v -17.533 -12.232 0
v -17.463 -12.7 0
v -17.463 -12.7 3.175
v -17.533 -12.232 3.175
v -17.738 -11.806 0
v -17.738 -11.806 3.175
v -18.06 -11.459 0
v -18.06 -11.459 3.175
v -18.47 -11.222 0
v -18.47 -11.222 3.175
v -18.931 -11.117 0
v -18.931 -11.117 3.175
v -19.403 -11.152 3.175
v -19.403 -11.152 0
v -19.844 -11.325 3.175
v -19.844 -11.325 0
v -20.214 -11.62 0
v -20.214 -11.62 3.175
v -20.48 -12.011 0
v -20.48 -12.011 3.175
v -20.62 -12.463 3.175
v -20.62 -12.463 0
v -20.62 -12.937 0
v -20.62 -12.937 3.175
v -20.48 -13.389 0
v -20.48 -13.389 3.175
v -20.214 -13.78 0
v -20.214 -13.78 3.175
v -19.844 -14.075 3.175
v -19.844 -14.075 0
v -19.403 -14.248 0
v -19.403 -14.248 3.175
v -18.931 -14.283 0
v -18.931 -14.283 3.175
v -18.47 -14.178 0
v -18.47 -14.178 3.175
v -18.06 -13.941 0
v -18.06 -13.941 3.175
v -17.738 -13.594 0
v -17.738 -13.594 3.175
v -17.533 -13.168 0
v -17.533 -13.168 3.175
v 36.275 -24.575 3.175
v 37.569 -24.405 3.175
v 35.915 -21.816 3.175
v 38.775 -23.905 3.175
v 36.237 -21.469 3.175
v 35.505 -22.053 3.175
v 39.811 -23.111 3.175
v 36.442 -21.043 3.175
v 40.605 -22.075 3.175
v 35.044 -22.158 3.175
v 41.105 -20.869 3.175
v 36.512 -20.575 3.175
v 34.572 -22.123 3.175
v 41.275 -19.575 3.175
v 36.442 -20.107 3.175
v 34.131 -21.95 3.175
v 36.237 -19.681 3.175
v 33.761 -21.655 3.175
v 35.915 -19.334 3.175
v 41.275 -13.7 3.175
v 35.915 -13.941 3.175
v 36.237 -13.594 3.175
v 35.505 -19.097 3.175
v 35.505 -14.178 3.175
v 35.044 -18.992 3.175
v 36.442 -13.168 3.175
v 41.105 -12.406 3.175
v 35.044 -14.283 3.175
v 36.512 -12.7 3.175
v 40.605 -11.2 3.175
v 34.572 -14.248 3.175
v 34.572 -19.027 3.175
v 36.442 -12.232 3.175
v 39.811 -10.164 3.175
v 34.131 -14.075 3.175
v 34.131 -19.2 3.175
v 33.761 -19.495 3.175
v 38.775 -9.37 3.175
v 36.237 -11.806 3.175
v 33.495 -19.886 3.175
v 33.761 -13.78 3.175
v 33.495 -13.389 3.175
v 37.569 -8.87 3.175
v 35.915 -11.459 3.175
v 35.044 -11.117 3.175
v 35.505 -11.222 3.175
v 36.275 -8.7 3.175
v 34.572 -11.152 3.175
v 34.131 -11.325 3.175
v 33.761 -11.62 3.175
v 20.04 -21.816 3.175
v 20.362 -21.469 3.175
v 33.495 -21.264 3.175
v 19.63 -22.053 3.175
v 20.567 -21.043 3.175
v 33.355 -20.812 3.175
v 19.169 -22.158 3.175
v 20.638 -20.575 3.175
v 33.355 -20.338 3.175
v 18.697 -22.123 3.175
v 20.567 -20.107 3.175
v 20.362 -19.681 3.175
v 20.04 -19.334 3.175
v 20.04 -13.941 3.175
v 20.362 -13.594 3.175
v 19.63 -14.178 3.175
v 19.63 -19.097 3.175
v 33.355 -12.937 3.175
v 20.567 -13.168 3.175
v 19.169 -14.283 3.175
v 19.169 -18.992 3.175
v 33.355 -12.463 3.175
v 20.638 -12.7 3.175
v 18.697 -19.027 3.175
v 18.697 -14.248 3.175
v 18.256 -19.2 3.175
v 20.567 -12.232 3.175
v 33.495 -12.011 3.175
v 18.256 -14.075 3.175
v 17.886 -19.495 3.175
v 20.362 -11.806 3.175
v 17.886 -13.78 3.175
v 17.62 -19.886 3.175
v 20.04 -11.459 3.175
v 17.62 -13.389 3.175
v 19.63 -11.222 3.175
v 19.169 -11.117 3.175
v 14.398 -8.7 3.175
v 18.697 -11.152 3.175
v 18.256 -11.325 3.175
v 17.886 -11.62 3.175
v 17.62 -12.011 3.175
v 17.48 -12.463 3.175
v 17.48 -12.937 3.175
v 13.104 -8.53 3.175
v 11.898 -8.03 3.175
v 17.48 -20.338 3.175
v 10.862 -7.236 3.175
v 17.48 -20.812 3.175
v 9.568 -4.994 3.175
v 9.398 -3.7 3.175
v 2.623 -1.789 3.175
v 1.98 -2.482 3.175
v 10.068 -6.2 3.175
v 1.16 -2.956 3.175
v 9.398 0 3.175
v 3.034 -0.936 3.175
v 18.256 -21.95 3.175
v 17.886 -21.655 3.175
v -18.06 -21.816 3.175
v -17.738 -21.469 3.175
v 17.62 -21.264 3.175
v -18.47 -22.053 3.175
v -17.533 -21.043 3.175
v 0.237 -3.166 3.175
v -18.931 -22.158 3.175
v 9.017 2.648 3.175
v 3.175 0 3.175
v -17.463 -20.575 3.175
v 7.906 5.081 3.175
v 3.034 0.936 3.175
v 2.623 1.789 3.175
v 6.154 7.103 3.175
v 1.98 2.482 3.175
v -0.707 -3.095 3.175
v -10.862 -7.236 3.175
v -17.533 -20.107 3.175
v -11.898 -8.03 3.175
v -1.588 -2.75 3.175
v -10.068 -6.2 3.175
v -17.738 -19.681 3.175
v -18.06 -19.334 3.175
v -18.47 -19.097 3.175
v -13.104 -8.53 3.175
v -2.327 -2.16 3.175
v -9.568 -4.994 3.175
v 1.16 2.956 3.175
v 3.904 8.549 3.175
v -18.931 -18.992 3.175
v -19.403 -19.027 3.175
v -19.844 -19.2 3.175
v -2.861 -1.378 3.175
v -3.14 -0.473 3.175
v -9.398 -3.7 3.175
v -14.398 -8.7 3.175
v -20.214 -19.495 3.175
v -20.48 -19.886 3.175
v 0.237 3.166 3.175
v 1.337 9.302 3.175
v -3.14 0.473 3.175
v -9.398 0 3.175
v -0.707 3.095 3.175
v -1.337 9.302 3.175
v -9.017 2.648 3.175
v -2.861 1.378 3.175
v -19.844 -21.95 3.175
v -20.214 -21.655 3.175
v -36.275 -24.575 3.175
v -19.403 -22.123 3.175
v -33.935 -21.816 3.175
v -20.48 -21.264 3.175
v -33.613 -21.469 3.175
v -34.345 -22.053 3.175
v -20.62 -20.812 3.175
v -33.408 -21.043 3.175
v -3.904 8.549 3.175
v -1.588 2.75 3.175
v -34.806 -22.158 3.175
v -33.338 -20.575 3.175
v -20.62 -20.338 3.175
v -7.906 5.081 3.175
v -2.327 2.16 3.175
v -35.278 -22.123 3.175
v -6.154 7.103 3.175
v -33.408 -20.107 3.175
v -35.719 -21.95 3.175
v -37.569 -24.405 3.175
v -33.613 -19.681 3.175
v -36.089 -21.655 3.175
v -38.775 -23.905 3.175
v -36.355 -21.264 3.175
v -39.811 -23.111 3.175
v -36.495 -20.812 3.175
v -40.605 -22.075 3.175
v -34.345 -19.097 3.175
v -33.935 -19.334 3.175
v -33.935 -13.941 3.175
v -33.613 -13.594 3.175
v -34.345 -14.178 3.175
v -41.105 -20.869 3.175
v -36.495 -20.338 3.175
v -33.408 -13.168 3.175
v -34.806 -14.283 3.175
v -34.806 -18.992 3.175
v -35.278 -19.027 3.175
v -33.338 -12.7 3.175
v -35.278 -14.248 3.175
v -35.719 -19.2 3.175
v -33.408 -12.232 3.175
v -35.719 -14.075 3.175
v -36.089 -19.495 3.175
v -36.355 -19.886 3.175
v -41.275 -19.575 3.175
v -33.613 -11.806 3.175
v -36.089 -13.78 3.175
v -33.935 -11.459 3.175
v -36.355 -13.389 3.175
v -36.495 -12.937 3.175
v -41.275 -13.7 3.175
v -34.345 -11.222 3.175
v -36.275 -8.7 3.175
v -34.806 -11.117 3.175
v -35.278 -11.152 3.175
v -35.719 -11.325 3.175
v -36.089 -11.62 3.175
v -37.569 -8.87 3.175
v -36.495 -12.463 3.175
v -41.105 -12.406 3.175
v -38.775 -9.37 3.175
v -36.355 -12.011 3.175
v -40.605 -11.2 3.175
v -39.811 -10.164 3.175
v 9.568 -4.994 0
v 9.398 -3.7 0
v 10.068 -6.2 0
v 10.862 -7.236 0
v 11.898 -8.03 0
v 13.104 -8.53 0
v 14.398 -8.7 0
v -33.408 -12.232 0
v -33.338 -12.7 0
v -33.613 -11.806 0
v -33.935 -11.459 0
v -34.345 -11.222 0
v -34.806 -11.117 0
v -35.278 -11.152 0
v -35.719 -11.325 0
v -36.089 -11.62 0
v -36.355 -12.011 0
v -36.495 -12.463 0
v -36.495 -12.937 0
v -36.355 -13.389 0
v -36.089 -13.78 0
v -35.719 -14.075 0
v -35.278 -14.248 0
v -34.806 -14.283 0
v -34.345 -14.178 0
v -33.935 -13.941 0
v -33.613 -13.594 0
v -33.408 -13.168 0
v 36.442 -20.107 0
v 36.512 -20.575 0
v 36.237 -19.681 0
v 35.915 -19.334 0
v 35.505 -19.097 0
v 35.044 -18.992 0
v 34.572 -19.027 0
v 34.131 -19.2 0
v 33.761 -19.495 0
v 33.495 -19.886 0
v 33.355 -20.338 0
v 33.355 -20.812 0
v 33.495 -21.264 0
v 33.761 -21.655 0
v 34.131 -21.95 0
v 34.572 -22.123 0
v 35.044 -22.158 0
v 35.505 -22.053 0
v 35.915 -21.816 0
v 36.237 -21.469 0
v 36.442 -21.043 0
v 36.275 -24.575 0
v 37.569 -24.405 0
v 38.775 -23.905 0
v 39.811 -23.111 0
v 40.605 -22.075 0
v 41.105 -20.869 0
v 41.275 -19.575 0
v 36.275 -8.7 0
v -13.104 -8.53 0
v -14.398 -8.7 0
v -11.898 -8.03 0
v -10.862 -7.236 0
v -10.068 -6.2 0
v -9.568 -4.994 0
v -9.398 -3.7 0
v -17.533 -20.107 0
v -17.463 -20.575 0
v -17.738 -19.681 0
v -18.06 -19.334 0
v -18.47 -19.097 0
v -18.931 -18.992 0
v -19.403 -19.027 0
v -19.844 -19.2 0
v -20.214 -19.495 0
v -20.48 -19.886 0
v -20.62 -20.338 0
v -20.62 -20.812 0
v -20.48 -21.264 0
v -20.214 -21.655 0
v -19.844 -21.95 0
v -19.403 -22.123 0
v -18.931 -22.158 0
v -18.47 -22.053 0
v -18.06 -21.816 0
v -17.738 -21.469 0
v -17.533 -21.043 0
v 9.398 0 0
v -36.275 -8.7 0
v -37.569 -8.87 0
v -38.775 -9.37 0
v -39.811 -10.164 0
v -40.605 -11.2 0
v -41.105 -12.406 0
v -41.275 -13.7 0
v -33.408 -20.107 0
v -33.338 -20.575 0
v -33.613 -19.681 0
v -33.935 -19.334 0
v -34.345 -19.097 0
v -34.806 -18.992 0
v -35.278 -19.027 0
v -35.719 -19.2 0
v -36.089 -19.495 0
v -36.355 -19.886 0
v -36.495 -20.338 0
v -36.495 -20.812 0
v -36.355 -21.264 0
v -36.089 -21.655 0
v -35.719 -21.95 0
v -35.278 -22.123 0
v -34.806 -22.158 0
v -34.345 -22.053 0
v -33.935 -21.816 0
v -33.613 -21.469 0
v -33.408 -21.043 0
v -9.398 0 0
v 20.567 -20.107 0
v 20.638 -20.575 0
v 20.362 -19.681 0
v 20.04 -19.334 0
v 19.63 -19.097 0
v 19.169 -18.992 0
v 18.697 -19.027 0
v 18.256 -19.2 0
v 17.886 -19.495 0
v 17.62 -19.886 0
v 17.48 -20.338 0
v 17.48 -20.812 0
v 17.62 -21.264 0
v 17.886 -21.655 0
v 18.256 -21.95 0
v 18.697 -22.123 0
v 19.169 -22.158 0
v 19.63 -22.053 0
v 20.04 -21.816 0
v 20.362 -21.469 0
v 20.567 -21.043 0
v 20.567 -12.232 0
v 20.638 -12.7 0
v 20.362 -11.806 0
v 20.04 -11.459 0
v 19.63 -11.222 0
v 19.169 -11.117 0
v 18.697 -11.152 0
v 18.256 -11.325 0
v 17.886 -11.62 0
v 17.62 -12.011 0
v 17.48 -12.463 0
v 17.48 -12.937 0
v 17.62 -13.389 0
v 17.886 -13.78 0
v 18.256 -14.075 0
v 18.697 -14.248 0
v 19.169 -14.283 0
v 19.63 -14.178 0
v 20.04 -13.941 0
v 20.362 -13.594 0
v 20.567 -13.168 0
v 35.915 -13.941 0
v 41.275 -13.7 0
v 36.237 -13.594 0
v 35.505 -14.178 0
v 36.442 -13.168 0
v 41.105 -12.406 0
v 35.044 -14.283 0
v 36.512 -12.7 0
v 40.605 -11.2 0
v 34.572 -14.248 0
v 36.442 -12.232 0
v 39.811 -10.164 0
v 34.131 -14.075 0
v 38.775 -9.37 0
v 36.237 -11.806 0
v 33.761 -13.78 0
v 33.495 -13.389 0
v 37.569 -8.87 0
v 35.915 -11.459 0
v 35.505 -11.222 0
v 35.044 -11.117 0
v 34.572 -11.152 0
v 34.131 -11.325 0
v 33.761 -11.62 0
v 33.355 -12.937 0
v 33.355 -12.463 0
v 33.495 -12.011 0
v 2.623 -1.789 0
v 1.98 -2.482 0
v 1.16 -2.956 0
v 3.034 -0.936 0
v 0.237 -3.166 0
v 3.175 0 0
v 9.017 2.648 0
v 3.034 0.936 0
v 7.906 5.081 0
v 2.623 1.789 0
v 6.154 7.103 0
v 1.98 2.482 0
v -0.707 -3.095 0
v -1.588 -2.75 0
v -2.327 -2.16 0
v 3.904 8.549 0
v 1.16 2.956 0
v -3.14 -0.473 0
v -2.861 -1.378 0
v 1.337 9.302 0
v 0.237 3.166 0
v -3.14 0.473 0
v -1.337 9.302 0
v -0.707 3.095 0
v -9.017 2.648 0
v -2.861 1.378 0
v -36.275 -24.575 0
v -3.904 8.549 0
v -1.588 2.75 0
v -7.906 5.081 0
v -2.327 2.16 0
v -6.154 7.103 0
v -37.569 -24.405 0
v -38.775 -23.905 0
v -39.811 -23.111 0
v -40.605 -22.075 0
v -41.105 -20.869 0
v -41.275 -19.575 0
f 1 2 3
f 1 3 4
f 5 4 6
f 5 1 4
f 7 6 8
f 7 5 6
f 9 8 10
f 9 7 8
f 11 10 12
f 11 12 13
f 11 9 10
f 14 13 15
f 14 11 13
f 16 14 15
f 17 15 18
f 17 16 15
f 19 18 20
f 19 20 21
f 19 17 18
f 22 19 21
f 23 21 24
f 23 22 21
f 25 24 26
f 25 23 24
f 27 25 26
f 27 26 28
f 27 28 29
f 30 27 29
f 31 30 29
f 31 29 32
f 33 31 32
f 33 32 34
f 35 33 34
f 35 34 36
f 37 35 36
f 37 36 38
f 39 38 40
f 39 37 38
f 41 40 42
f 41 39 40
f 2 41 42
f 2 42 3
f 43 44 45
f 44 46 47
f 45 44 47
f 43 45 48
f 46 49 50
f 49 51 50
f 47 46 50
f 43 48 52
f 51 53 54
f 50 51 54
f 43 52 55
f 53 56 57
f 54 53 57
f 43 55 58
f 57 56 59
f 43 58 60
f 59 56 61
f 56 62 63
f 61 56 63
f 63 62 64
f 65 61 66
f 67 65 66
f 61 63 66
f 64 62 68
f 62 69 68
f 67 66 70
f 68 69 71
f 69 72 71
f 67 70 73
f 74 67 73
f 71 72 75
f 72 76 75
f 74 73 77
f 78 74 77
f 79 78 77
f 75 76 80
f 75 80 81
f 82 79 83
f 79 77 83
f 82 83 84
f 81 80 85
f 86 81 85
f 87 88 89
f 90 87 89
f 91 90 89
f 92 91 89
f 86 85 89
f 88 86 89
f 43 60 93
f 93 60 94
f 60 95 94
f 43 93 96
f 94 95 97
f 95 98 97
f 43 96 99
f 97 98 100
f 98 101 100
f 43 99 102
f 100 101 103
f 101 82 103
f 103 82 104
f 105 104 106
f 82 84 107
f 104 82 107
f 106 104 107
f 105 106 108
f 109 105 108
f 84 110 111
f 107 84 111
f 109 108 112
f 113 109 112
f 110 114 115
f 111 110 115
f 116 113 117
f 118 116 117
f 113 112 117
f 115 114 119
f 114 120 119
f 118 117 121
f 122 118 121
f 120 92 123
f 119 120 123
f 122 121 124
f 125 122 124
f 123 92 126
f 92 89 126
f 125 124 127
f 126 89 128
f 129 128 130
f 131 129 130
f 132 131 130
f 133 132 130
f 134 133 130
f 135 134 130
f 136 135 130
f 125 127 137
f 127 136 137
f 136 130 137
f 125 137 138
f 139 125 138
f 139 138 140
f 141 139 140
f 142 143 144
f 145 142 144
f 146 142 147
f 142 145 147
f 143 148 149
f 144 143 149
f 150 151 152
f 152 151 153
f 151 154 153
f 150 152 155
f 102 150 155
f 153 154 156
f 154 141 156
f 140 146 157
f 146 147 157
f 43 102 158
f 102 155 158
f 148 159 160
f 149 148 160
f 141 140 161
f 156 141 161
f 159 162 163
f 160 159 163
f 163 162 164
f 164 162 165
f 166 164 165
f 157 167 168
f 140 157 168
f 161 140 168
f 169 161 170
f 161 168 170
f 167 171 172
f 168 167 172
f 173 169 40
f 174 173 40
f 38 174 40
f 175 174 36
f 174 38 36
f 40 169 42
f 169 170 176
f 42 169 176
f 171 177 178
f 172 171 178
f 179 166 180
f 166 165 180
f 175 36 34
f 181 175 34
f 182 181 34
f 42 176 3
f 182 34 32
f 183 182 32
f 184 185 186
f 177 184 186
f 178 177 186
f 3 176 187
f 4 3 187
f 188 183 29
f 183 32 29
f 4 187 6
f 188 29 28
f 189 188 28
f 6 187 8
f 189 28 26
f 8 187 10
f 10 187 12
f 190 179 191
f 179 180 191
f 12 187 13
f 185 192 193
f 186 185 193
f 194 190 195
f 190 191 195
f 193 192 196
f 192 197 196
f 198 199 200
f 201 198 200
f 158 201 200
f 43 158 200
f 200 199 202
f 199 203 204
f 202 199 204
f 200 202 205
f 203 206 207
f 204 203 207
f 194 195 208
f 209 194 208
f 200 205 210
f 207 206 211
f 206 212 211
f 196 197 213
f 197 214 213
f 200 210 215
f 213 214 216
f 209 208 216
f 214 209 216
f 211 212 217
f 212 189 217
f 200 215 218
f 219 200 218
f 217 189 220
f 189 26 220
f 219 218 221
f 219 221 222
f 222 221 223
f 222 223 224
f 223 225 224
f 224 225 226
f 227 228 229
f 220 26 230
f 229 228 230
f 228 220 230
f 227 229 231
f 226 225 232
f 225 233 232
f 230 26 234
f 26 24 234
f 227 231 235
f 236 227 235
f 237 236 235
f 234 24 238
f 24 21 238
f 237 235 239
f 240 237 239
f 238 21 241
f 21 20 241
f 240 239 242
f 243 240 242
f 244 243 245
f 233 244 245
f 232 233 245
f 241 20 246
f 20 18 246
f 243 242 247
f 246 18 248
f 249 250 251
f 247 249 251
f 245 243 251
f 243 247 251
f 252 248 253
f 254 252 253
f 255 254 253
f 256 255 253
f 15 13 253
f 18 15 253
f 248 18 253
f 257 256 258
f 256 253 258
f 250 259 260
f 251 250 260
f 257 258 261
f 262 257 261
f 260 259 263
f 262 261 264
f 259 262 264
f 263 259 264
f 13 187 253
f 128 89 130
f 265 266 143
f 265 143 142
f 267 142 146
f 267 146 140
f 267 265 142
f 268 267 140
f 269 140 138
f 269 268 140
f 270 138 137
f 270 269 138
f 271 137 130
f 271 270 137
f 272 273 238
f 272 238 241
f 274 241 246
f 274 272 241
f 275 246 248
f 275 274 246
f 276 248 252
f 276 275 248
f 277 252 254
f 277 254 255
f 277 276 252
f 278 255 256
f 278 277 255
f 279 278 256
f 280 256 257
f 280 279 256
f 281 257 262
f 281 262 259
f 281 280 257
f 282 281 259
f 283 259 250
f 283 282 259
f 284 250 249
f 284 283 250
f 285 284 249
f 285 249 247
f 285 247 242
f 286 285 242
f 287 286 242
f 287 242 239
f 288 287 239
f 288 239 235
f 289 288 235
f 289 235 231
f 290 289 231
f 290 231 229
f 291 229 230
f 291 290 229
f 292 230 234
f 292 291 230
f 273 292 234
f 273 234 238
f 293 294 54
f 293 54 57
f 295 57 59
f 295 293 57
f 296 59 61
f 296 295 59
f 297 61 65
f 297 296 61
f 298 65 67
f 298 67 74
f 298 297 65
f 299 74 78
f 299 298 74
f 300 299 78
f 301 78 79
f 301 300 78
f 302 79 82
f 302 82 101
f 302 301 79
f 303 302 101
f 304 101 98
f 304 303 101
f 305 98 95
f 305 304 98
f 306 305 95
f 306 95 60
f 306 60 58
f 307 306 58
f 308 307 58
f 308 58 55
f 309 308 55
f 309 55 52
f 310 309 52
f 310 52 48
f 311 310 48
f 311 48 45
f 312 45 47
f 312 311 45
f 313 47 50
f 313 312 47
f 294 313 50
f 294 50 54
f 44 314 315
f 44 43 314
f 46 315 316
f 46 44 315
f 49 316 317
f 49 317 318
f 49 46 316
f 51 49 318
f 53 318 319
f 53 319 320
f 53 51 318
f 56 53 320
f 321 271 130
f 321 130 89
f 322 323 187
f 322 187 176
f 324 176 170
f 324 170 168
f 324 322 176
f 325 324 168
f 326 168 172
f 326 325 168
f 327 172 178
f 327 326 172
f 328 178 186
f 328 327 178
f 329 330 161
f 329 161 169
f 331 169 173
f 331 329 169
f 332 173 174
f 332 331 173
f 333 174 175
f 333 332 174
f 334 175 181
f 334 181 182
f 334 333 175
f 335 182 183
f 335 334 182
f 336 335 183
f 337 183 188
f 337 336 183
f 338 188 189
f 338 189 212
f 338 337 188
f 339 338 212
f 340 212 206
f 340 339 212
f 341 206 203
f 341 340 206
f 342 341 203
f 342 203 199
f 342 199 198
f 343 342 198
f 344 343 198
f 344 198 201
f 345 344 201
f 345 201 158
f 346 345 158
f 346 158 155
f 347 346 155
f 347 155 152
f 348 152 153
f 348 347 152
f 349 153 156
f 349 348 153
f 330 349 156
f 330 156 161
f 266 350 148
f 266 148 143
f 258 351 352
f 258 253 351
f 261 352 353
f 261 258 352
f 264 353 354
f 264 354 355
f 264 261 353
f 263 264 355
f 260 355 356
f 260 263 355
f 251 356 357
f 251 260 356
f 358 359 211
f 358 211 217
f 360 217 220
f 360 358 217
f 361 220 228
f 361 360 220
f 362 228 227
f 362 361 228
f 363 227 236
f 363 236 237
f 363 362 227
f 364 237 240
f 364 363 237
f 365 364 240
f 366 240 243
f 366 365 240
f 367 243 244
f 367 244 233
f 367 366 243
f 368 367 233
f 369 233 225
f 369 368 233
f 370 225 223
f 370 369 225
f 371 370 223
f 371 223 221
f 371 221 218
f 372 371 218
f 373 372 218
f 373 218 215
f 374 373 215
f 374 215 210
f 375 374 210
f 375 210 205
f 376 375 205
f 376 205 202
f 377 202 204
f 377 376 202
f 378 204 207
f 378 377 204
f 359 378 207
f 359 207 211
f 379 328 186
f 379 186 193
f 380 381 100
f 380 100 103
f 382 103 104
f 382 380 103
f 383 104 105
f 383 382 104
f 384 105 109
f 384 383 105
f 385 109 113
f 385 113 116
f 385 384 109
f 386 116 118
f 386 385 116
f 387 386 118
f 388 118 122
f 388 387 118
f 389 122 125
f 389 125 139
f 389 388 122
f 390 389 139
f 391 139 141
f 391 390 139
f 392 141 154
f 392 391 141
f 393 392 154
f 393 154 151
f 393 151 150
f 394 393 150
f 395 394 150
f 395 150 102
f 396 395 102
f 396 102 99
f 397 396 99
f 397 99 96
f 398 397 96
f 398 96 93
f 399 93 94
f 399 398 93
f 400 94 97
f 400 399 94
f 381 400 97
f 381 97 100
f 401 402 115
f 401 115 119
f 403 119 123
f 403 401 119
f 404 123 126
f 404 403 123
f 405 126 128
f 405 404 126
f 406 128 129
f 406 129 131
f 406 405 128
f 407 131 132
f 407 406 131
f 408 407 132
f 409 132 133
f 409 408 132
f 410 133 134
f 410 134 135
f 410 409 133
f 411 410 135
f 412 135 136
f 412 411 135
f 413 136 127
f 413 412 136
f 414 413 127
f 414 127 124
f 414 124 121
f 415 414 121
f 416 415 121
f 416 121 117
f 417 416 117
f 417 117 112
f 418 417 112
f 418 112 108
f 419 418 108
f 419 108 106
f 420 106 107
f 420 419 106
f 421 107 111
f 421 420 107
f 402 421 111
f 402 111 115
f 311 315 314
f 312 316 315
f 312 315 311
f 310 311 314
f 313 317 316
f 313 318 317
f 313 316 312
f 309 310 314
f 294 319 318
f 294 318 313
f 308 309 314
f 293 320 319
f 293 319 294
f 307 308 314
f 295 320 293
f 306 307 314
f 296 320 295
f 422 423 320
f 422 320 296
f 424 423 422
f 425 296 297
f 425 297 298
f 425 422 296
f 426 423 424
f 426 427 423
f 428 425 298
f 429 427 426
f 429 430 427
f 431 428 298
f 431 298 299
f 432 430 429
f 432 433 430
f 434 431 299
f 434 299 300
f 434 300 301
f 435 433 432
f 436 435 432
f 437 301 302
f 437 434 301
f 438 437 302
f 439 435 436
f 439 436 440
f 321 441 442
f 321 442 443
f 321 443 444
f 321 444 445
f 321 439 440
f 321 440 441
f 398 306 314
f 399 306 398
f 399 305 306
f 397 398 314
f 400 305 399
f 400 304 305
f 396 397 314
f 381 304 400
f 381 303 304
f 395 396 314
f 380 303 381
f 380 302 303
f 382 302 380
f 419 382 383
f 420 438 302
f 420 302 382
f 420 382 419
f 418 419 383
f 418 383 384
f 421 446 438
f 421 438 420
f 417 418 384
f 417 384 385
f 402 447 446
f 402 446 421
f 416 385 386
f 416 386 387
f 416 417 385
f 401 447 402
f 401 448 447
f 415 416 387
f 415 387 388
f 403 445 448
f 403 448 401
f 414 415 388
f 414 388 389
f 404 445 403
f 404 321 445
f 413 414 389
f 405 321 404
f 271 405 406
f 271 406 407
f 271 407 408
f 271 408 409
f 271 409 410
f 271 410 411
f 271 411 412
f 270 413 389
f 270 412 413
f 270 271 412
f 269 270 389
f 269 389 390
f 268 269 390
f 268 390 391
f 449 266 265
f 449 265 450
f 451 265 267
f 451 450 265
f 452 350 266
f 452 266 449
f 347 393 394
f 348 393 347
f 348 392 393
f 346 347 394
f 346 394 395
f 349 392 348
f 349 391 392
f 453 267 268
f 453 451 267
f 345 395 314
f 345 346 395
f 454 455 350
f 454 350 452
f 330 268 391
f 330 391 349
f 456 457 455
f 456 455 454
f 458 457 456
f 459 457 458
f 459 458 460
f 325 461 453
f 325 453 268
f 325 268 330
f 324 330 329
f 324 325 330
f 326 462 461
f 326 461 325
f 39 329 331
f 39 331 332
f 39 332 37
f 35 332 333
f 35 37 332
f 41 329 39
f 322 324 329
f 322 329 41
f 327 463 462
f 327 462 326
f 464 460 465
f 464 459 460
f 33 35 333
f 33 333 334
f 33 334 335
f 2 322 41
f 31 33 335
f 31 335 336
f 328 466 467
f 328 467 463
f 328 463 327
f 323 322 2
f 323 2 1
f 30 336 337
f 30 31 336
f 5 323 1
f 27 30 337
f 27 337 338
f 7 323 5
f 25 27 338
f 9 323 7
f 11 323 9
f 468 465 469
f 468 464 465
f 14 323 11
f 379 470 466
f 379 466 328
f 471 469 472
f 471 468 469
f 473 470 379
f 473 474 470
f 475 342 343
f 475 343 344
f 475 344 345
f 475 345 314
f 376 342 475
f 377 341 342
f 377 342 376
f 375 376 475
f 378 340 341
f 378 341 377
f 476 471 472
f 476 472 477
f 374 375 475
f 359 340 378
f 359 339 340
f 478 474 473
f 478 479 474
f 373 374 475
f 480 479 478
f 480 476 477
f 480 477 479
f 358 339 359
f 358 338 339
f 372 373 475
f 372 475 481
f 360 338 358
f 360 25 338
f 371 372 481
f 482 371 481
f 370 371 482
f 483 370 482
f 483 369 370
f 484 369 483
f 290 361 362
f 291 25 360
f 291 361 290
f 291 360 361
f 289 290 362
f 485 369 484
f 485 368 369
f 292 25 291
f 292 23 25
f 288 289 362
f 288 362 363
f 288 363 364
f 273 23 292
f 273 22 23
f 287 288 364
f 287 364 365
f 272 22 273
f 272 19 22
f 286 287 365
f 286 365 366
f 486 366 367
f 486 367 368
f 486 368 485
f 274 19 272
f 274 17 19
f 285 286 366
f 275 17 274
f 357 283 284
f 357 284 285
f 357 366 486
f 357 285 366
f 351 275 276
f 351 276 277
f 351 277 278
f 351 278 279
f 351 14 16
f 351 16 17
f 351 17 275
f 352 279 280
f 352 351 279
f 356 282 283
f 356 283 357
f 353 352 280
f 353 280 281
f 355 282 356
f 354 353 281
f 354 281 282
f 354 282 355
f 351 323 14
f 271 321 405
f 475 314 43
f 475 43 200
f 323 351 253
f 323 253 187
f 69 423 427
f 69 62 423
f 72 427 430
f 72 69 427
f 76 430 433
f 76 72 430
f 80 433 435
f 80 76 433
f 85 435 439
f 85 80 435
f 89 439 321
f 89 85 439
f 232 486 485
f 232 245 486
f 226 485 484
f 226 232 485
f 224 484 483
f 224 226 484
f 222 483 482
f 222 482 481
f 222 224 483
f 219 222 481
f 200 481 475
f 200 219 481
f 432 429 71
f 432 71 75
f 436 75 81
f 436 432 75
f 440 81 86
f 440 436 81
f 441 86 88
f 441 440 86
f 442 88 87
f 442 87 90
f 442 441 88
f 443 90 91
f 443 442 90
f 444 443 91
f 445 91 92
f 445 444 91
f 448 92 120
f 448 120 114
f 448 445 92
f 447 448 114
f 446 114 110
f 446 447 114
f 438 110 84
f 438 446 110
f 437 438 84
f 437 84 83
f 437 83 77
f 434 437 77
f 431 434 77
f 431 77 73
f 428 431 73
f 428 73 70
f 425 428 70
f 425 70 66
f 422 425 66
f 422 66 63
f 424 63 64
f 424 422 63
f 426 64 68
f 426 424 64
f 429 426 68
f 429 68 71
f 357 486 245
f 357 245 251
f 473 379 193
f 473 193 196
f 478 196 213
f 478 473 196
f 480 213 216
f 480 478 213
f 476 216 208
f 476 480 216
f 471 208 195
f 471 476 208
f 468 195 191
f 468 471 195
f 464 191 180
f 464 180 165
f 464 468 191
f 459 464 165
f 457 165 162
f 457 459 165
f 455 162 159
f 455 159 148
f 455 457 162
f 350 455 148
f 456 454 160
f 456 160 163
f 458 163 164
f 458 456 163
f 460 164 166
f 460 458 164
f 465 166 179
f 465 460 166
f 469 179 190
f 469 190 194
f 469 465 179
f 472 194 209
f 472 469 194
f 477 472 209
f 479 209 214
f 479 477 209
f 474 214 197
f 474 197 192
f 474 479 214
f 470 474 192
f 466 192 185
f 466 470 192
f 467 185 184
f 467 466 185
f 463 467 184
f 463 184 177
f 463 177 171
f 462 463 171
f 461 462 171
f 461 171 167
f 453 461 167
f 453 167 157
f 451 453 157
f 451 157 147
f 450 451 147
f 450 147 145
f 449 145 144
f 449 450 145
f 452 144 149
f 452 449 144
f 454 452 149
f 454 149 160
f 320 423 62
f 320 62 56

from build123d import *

# Parameters (mm, degrees)
SKETCH1_R           = 3.175
SKETCH1_R_2         = 1.5875
BOSS_EXTRUDE1_DEPTH = 3.175
FILLET1_R           = 5


with BuildPart() as part:
    # Sketch1 → Boss-Extrude1 (new body)
    with BuildSketch(Plane.XY):
        with BuildLine():
            Line((-41.275, -8.7), (-14.398, -8.7))
            ThreePointArc((-14.398, -8.7), (-10.862466094, -7.235533906), (-9.398, -3.7))
            Line((-9.398, -3.7), (-9.398, 0))
            ThreePointArc((-9.398, 0), (0, 9.398), (9.398, 0))
            Line((9.398, 0), (9.398, -3.7))
            ThreePointArc((9.398, -3.7), (10.862466094, -7.235533906), (14.398, -8.7))
            Line((14.398, -8.7), (41.275, -8.7))
            Line((41.275, -8.7), (41.275, -24.575))
            Line((41.275, -24.575), (-41.275, -24.575))
            Line((-41.275, -24.575), (-41.275, -8.7))
        make_face()
        Circle(SKETCH1_R, mode=Mode.SUBTRACT)
        with Locations((-34.925, -12.7)):
            Circle(SKETCH1_R_2, mode=Mode.SUBTRACT)
        with Locations((-34.925, -20.575)):
            Circle(SKETCH1_R_2, mode=Mode.SUBTRACT)
        with Locations((-19.05, -12.7)):
            Circle(SKETCH1_R_2, mode=Mode.SUBTRACT)
        with Locations((-19.05, -20.575)):
            Circle(SKETCH1_R_2, mode=Mode.SUBTRACT)
        with Locations((19.05, -20.575)):
            Circle(SKETCH1_R_2, mode=Mode.SUBTRACT)
        with Locations((19.05, -12.7)):
            Circle(SKETCH1_R_2, mode=Mode.SUBTRACT)
        with Locations((34.925, -20.575)):
            Circle(SKETCH1_R_2, mode=Mode.SUBTRACT)
        with Locations((34.925, -12.7)):
            Circle(SKETCH1_R_2, mode=Mode.SUBTRACT)
    extrude(amount=BOSS_EXTRUDE1_DEPTH)

    # Fillet1
    fillet1_edges = [part.edges().sort_by_distance(p)[0] for p in [
        (-41.275, -8.7, 1.5875),
        (41.275, -8.7, 1.5875),
        (41.275, -24.575, 1.5875),
        (-41.275, -24.575, 1.5875),
    ]]
    fillet(fillet1_edges, radius=FILLET1_R)


solid = part.part
